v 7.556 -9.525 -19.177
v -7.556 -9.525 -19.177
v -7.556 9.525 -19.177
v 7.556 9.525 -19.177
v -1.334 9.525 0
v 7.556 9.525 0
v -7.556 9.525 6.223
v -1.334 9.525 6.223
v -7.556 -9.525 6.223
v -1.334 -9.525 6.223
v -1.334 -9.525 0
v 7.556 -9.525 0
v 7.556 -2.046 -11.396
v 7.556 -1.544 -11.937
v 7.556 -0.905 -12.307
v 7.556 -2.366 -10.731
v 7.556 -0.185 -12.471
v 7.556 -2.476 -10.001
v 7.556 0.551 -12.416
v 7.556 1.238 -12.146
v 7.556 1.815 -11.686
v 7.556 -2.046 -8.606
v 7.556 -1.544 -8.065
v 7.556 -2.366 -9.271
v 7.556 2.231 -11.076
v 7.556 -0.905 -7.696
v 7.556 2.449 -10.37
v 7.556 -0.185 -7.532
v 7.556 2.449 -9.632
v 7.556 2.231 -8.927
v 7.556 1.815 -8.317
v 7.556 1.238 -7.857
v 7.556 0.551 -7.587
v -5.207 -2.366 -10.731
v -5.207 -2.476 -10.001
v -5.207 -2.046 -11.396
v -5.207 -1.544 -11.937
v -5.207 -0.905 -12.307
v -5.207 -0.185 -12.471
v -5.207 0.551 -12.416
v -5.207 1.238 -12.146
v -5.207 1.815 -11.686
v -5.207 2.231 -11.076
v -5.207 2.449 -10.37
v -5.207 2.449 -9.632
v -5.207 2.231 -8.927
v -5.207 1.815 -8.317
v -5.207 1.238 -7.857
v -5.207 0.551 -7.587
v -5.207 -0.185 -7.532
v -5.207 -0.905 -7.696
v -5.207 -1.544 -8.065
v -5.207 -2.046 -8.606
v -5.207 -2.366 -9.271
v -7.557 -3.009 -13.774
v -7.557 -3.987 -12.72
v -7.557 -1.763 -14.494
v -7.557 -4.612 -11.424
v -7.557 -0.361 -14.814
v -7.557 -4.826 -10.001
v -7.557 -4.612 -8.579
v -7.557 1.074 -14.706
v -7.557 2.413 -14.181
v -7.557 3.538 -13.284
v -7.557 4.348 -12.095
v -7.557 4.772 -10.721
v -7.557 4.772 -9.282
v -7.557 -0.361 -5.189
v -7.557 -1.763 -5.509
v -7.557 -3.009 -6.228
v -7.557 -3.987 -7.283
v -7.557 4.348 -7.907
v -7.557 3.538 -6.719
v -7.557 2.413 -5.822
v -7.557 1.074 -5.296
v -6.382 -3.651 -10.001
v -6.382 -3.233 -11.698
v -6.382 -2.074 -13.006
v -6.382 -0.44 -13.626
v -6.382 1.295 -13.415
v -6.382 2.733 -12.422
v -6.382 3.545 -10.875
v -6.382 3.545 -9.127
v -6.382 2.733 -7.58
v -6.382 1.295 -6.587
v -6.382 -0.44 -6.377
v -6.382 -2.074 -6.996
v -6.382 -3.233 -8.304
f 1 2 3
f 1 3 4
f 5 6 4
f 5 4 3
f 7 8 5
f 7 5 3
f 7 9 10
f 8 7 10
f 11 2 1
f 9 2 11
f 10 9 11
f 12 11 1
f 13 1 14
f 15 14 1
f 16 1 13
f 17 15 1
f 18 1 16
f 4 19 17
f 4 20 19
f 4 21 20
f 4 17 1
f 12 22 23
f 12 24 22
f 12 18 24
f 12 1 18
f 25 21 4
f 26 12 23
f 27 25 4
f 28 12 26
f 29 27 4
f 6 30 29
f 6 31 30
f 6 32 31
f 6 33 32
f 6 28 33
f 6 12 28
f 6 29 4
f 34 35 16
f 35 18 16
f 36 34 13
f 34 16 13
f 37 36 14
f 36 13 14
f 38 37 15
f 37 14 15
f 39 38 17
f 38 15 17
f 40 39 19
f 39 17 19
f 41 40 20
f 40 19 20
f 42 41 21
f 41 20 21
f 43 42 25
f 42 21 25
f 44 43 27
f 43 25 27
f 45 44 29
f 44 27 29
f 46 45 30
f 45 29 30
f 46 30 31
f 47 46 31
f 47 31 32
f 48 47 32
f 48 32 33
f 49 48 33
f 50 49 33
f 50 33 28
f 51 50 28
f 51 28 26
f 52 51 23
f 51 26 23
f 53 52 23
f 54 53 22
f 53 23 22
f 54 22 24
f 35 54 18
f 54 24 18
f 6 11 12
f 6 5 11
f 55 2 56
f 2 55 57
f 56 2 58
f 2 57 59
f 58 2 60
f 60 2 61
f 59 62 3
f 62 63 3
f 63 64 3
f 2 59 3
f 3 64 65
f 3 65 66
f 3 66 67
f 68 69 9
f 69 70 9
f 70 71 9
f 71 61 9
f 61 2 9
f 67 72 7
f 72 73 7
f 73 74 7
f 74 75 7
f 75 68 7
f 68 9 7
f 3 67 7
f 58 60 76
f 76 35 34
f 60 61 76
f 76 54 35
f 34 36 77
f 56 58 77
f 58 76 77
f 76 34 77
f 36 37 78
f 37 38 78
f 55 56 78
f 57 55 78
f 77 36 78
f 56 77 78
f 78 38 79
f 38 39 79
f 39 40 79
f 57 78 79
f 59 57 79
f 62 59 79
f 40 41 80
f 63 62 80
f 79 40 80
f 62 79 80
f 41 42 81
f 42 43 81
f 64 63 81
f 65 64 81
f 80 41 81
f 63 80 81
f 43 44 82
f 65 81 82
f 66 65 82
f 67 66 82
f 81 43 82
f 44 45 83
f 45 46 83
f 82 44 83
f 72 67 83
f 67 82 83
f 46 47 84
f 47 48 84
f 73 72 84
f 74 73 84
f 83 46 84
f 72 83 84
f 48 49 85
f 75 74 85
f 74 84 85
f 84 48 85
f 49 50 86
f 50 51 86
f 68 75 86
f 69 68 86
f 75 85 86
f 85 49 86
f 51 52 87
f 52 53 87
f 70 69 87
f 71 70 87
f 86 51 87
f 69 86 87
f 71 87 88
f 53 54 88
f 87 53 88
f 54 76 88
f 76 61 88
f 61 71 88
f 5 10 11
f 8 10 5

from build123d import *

# Parameters (mm, degrees)
F0_W           = 6.223
F0_H           = 19.05
F1_DEPTH       = 6.223
F1_DEPTH_BACK  = 19.177
F0_W_2         = 8.89
F2_DEPTH       = 19.177
F5_D           = 4.953
F5_START       = 0.0127
F5_CSINK_D     = 9.652
F5_CSINK_ANGLE = 90


with BuildPart() as f1:
    # F0 (on Top) → F1 (new body, two sides)
    with BuildSketch(Plane.XY) as f1_sk:
        with Locations((-4.445, 0)):
            Rectangle(F0_W, F0_H)
    extrude(amount=F1_DEPTH)
    extrude(f1_sk.sketch, amount=-F1_DEPTH_BACK)

    # F0 (on Top) → F2 (join)
    with BuildSketch(Plane.XY):
        with Locations((3.1115, 0)):
            Rectangle(F0_W_2, F0_H)
        with Locations((-4.445, 0)):
            Rectangle(F0_W, F0_H)
    extrude(amount=-F2_DEPTH)

    # F5 (through all)
    # its depths count from where the whole tool has entered the part; down to there all is cleared
    with Locations(Plane(origin=(-7.5692, 0, 0), x_dir=(0, 1, 0), z_dir=(-1, 0, 0)).offset(-F5_START)):
        with Locations((0, 10.0012505427)):
            CounterSinkHole(F5_D / 2, F5_CSINK_D / 2, counter_sink_angle=F5_CSINK_ANGLE)


solid = f1.part
